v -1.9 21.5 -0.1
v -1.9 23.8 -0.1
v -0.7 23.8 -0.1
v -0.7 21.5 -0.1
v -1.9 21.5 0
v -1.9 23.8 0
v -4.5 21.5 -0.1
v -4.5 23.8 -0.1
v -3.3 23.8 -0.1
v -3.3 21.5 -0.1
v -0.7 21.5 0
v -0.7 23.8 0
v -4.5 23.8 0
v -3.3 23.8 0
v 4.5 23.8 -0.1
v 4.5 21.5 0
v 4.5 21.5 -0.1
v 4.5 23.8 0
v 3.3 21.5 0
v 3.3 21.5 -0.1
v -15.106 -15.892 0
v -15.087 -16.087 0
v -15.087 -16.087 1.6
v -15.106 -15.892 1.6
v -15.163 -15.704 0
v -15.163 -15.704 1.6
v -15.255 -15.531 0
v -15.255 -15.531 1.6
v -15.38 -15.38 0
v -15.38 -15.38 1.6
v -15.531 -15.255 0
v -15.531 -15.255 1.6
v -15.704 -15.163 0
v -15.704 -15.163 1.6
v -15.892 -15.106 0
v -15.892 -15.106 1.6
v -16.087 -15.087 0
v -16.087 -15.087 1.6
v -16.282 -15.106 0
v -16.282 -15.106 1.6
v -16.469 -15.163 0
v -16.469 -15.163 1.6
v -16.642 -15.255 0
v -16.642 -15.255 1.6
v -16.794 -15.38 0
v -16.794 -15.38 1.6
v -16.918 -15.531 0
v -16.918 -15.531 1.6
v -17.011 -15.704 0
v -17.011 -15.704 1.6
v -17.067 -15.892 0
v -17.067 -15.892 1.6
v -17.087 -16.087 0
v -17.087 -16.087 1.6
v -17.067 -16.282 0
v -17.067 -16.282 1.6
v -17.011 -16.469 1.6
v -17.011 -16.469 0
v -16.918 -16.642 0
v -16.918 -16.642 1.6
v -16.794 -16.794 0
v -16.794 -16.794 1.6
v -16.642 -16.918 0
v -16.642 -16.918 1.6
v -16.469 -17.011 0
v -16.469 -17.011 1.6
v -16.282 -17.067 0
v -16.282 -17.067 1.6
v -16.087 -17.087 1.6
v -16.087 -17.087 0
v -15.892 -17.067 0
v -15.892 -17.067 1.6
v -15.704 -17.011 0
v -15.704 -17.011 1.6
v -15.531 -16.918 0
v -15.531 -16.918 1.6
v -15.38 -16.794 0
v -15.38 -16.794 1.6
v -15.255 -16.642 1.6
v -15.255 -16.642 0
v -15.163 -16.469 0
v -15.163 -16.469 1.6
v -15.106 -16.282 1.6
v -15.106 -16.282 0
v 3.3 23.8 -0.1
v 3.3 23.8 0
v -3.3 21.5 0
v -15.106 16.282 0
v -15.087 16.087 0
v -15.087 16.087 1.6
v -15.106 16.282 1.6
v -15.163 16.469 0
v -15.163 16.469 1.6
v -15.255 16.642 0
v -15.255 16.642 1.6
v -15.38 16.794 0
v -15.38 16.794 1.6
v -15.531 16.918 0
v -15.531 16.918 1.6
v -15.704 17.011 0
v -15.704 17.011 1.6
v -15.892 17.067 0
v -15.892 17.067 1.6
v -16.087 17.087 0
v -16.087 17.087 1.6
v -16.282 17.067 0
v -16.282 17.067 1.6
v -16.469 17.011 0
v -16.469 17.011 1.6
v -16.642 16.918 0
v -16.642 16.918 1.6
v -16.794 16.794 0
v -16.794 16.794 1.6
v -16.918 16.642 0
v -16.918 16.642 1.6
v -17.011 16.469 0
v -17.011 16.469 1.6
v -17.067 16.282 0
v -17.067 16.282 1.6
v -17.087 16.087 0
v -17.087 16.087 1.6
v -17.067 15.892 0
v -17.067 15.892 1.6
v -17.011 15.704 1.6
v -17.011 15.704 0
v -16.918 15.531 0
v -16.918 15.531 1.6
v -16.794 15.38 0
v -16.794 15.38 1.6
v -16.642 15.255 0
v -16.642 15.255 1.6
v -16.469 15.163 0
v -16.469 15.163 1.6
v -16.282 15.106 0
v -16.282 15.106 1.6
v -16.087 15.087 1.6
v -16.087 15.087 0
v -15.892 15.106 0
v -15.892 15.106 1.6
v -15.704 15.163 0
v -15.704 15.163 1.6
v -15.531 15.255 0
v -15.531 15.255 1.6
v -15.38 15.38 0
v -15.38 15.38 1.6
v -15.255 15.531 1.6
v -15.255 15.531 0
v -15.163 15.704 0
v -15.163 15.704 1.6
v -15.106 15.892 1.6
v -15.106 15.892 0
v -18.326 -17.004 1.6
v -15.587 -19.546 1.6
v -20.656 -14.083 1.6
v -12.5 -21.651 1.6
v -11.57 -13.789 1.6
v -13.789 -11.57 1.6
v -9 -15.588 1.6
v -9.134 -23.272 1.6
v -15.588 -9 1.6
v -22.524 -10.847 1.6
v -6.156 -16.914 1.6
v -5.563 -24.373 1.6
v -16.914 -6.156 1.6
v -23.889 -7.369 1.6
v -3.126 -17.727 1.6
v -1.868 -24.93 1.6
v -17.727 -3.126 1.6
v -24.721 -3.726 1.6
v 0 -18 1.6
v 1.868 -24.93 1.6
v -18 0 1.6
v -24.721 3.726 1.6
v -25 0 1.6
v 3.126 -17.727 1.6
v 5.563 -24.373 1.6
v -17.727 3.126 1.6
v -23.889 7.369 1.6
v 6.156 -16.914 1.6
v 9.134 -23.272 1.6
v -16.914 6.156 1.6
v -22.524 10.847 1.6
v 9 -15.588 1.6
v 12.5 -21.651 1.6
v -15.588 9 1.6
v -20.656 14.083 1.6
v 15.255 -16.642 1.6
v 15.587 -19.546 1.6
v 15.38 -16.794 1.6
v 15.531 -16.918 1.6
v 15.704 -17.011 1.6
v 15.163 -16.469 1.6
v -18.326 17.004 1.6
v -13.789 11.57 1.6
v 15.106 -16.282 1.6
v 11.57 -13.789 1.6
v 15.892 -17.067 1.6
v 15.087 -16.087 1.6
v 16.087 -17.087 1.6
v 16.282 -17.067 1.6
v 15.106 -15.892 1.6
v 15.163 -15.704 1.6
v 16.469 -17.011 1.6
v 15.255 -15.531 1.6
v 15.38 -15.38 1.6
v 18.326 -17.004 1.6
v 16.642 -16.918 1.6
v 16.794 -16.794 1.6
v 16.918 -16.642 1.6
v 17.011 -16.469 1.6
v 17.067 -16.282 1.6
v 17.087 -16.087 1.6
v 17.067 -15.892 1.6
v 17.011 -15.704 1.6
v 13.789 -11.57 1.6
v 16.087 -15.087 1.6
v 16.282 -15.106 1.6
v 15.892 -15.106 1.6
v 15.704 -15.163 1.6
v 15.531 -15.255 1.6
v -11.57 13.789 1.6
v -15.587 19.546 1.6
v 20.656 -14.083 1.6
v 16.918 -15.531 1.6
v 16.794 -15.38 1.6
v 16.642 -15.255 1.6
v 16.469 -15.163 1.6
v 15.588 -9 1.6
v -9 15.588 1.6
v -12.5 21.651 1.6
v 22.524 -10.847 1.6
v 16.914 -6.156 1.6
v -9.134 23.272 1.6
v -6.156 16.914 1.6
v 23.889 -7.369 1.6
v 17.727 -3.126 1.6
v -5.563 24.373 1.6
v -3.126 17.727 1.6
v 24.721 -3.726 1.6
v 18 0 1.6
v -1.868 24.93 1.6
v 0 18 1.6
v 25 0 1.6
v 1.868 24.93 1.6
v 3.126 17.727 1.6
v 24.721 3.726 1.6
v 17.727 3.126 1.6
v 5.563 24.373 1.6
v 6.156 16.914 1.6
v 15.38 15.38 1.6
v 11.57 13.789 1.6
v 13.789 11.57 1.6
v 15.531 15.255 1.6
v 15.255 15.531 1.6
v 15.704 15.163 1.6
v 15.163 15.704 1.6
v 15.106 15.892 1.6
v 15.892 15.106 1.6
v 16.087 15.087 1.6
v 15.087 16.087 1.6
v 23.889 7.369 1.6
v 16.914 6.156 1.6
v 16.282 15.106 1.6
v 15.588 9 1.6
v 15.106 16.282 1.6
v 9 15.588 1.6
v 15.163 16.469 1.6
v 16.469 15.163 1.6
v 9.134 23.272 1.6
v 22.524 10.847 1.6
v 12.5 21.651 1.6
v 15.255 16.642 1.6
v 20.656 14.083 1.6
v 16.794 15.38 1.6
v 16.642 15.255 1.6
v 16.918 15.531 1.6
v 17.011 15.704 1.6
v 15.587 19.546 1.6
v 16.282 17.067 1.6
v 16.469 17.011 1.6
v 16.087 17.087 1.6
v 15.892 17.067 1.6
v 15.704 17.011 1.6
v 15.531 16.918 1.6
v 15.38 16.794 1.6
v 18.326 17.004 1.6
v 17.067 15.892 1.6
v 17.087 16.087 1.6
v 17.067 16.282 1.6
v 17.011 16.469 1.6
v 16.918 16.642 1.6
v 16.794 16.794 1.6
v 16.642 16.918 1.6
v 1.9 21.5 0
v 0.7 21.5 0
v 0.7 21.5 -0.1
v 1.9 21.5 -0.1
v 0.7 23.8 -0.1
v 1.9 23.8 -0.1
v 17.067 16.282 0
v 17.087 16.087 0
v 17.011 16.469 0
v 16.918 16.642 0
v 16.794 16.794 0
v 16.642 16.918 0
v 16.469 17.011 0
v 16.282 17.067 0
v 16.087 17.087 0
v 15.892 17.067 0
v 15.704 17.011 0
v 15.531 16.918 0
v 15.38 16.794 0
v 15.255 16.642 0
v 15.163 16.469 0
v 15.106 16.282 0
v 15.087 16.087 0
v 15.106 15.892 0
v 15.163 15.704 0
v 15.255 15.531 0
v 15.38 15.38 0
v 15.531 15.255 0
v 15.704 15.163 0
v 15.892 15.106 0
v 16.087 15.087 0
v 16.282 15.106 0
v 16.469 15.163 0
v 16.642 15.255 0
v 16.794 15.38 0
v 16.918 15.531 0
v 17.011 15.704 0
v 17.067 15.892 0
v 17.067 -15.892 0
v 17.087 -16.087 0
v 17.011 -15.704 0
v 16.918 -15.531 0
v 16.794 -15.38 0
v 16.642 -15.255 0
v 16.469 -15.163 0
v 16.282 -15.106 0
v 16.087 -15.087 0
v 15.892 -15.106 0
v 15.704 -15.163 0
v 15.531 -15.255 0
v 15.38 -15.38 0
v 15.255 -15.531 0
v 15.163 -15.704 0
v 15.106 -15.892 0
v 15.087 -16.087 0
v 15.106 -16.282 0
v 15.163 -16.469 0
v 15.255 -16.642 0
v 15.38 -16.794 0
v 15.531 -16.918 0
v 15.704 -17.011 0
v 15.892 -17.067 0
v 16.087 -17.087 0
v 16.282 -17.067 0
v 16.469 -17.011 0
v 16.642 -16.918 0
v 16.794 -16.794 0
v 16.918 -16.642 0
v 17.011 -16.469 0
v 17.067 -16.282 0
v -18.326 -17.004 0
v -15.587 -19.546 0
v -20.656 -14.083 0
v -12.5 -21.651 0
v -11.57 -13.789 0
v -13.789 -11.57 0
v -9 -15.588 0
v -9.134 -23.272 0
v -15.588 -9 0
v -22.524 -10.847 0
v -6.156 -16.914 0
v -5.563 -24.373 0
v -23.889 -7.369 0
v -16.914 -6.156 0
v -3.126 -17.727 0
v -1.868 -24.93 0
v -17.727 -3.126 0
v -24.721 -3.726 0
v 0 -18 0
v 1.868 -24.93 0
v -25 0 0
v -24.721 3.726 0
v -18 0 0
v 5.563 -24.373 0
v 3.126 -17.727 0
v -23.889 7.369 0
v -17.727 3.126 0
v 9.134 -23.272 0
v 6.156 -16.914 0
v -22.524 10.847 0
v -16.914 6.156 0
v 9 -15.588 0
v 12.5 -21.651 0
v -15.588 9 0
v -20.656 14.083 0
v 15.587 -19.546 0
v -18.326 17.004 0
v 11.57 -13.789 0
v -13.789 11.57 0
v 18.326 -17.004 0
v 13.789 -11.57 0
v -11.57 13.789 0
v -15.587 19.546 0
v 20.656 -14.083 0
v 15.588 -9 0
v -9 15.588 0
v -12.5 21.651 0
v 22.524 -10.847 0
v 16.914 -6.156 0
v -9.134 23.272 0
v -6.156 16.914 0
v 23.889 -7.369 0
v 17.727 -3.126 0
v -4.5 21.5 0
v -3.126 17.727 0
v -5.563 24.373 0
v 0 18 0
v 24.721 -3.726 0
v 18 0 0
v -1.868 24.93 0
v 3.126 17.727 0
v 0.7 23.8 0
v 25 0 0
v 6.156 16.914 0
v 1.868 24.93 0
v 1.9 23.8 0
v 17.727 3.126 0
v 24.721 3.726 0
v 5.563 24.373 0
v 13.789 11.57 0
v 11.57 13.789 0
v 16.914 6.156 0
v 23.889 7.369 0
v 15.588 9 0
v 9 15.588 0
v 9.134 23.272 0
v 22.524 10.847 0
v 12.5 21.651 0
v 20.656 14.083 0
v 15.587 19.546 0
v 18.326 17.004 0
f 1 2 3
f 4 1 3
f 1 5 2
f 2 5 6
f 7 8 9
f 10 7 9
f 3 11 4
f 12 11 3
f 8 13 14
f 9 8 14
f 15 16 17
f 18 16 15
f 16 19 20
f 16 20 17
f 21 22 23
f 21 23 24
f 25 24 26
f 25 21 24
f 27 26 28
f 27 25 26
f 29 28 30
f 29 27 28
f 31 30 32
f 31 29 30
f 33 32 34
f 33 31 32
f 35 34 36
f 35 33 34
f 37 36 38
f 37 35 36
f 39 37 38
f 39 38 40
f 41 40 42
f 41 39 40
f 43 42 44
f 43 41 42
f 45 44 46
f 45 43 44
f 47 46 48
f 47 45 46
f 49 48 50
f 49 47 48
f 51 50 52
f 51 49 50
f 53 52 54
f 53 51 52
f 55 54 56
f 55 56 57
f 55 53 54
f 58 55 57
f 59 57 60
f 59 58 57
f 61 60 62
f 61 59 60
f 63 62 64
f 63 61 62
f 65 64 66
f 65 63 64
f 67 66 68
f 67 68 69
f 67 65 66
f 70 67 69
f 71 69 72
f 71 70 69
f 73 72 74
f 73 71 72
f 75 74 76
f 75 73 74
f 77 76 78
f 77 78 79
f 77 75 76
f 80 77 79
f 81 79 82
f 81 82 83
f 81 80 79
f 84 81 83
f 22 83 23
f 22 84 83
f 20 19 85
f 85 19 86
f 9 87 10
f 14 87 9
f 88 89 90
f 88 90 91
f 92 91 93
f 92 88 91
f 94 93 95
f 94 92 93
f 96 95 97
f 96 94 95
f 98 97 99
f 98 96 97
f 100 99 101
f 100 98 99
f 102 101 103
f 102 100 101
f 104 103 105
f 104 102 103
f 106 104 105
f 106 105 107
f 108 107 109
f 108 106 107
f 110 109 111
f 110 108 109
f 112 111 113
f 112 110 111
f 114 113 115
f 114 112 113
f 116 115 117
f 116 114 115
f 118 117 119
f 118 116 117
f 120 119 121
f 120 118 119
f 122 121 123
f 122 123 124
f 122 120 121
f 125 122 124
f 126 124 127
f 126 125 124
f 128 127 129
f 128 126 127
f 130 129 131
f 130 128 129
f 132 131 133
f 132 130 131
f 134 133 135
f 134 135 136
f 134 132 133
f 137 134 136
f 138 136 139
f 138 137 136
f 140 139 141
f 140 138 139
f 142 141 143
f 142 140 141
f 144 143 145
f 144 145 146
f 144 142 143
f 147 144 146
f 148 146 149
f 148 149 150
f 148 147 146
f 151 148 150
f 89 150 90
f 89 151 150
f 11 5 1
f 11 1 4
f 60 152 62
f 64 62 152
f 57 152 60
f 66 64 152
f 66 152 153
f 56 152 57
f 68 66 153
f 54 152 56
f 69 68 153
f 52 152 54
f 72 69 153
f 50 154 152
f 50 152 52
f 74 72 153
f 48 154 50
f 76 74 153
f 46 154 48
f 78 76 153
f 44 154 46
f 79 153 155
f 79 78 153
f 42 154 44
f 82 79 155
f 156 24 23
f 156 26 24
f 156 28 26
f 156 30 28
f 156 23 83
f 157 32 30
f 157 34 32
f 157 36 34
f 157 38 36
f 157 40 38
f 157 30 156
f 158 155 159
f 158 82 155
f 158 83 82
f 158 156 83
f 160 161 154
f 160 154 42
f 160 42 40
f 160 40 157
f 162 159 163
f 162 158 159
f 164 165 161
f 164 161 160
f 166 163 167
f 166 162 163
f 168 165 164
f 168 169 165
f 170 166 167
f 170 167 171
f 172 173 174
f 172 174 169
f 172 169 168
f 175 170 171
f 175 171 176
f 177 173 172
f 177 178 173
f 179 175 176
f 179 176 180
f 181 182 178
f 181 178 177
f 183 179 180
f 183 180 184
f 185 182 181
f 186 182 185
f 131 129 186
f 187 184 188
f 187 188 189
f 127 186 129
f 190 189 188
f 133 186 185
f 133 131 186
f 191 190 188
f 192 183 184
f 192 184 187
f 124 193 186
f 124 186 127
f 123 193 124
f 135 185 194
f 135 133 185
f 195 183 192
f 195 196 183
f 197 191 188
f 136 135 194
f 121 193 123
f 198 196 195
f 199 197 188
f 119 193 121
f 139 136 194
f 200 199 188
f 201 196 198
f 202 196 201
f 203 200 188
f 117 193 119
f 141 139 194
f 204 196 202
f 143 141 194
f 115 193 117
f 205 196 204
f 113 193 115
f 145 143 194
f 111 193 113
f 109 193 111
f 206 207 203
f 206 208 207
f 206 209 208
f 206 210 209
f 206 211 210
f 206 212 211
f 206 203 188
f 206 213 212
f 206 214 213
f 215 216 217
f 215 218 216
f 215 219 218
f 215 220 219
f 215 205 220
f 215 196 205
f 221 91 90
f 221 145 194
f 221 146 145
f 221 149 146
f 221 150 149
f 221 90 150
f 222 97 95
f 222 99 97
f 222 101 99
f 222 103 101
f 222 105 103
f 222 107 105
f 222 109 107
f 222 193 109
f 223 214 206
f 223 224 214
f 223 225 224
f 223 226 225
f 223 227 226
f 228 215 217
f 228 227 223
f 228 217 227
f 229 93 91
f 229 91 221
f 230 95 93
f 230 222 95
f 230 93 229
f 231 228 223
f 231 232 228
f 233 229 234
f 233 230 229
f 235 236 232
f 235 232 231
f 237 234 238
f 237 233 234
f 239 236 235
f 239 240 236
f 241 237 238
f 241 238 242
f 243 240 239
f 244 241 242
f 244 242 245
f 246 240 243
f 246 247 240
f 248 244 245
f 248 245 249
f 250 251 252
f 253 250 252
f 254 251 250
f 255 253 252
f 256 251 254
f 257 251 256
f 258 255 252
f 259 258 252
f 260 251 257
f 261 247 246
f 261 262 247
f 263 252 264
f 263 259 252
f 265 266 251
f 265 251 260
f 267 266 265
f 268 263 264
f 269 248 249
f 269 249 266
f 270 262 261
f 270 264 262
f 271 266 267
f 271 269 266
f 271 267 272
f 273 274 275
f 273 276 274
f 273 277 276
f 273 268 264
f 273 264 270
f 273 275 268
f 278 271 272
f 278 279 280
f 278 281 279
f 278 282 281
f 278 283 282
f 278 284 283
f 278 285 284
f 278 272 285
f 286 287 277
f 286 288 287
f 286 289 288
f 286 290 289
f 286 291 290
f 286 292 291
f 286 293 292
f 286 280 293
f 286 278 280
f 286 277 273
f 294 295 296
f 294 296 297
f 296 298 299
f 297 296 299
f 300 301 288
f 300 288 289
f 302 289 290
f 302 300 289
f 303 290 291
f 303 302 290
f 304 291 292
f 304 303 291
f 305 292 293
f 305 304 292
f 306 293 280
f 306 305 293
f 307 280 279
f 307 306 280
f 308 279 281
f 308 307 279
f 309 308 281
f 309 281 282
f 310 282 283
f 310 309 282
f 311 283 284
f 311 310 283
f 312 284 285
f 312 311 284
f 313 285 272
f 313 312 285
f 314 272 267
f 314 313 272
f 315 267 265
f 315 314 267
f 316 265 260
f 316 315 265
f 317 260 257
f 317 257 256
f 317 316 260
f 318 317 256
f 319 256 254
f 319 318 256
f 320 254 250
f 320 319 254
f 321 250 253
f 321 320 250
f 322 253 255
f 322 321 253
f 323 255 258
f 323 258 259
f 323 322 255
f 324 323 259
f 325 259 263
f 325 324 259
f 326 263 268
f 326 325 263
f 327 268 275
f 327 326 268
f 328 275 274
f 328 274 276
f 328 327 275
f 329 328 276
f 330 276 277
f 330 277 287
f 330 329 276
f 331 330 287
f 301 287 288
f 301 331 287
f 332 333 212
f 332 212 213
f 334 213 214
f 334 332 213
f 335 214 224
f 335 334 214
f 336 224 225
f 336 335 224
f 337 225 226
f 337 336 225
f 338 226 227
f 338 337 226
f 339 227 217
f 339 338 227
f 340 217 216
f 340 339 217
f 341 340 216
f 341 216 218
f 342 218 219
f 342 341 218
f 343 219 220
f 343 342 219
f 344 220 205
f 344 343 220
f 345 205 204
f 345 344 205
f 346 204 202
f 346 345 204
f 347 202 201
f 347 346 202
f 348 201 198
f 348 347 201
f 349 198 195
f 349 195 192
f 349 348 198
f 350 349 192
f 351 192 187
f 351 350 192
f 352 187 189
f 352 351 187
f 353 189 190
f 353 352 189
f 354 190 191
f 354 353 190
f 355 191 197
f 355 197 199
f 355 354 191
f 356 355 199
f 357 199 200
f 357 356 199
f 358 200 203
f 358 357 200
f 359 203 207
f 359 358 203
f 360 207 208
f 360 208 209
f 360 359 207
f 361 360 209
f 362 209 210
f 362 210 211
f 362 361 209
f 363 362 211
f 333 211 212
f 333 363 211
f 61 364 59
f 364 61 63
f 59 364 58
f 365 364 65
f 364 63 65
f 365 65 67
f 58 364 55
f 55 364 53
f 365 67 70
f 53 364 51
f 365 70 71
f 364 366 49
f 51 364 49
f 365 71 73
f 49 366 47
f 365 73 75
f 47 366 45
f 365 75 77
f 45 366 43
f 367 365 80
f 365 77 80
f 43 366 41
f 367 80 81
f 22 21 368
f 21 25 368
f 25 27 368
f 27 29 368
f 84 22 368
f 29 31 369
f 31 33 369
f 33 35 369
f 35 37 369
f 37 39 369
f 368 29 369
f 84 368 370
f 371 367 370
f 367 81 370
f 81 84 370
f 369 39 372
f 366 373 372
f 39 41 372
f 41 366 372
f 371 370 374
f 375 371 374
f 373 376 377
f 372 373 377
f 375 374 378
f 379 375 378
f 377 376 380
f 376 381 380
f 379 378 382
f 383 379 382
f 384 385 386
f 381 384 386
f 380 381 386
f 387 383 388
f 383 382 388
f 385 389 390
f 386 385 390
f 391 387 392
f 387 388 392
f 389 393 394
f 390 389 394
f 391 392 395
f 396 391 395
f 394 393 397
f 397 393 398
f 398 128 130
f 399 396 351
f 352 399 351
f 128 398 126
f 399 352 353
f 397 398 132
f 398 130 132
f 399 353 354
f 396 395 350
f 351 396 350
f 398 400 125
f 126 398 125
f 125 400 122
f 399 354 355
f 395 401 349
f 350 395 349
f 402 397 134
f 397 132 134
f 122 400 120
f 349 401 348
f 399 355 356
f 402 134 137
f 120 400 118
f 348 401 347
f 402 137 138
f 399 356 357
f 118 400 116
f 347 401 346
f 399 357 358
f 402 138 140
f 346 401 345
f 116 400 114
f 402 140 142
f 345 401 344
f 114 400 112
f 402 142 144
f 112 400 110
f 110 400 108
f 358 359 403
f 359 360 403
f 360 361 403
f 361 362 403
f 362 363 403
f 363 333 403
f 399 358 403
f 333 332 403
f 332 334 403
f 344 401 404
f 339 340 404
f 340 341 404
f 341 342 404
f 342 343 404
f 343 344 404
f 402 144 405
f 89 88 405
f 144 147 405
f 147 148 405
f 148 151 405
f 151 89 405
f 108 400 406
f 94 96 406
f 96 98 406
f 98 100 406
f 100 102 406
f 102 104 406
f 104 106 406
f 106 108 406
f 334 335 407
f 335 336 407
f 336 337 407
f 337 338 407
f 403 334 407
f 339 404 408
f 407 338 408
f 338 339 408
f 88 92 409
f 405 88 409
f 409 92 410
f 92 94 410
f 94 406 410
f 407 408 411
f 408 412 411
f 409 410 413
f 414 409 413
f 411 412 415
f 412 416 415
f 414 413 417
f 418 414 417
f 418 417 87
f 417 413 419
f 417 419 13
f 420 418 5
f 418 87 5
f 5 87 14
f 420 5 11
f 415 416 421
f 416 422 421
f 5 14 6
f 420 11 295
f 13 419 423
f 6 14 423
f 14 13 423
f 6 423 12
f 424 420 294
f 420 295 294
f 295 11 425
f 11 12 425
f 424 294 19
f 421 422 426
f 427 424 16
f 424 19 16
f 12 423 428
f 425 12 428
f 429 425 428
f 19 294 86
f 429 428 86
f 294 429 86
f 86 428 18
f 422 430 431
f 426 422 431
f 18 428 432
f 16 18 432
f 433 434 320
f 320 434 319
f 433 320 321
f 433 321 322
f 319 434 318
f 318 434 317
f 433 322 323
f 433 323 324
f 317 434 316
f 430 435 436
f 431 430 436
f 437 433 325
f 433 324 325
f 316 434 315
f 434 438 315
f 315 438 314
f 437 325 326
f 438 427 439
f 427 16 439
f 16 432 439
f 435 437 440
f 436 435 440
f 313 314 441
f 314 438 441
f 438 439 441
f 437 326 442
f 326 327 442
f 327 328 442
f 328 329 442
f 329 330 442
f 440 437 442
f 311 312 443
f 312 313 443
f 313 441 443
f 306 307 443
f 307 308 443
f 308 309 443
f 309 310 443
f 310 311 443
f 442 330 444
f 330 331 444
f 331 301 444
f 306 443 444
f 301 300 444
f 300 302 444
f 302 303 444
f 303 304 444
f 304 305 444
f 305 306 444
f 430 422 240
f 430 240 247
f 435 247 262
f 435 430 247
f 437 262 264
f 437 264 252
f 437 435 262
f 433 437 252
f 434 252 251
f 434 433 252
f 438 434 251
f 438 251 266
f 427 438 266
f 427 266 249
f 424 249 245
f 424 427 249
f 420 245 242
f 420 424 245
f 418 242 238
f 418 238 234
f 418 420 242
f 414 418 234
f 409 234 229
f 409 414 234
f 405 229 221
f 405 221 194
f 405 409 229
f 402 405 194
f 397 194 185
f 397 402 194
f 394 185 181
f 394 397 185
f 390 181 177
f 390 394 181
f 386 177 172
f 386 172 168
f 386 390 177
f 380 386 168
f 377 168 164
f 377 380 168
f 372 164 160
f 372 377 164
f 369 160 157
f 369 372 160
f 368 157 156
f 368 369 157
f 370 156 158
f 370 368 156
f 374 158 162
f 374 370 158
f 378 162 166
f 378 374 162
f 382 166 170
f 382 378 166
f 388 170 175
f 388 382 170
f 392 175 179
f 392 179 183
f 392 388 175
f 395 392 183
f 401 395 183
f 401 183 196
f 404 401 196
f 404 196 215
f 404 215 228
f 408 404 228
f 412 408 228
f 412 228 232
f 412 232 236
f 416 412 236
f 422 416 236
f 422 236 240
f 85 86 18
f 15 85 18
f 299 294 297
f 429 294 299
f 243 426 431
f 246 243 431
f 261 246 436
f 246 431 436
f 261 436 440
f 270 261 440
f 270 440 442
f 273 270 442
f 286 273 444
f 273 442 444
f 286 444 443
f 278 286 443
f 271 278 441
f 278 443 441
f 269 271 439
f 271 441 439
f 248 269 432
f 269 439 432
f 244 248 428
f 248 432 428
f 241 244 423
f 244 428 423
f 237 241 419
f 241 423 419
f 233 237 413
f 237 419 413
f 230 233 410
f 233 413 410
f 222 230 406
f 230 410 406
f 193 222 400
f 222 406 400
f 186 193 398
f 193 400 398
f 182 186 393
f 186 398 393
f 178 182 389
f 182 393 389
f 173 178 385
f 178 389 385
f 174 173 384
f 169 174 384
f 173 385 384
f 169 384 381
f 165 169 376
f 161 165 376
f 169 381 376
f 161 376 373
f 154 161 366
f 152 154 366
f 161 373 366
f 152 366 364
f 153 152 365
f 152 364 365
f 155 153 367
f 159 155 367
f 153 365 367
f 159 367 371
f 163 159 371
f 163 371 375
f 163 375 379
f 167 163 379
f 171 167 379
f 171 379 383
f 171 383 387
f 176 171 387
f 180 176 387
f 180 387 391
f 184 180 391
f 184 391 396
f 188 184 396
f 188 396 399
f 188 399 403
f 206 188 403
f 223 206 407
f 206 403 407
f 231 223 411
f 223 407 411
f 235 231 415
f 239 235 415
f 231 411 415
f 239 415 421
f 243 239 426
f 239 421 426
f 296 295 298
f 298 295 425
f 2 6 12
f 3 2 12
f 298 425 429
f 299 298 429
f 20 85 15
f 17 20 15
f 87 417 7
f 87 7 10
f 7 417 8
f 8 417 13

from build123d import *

# Parameters (mm, degrees)
SKETCH1_R           = 25
SKETCH1_R_2         = 18
SKETCH1_R_3         = 1
BOSS_EXTRUDE2_DEPTH = 1.6
SKETCH2_W           = 1.2
SKETCH2_H           = 2.3
BOSS_EXTRUDE3_DEPTH = 0.1


with BuildPart() as part:
    # Sketch1 → Boss-Extrude2 (new body)
    with BuildSketch(Plane.XY):
        Circle(SKETCH1_R)
        Circle(SKETCH1_R_2, mode=Mode.SUBTRACT)
        with Locations((16.086679272, -16.086679272)):
            Circle(SKETCH1_R_3, mode=Mode.SUBTRACT)
        with Locations((-16.086679272, -16.086679272)):
            Circle(SKETCH1_R_3, mode=Mode.SUBTRACT)
        with Locations((-16.086679272, 16.086679272)):
            Circle(SKETCH1_R_3, mode=Mode.SUBTRACT)
        with Locations((16.086679272, 16.086679272)):
            Circle(SKETCH1_R_3, mode=Mode.SUBTRACT)
    extrude(amount=BOSS_EXTRUDE2_DEPTH)

    # Sketch2 → Boss-Extrude3 (add)
    with BuildSketch(Plane.XY):
        with Locations((1.3, 22.65)):
            Rectangle(SKETCH2_W, SKETCH2_H)
        with Locations((3.9, 22.65)):
            Rectangle(SKETCH2_W, SKETCH2_H)
        with Locations((-3.9, 22.65)):
            Rectangle(SKETCH2_W, SKETCH2_H)
        with Locations((-1.3, 22.65)):
            Rectangle(SKETCH2_W, SKETCH2_H)
    extrude(amount=-BOSS_EXTRUDE3_DEPTH)


solid = part.part
